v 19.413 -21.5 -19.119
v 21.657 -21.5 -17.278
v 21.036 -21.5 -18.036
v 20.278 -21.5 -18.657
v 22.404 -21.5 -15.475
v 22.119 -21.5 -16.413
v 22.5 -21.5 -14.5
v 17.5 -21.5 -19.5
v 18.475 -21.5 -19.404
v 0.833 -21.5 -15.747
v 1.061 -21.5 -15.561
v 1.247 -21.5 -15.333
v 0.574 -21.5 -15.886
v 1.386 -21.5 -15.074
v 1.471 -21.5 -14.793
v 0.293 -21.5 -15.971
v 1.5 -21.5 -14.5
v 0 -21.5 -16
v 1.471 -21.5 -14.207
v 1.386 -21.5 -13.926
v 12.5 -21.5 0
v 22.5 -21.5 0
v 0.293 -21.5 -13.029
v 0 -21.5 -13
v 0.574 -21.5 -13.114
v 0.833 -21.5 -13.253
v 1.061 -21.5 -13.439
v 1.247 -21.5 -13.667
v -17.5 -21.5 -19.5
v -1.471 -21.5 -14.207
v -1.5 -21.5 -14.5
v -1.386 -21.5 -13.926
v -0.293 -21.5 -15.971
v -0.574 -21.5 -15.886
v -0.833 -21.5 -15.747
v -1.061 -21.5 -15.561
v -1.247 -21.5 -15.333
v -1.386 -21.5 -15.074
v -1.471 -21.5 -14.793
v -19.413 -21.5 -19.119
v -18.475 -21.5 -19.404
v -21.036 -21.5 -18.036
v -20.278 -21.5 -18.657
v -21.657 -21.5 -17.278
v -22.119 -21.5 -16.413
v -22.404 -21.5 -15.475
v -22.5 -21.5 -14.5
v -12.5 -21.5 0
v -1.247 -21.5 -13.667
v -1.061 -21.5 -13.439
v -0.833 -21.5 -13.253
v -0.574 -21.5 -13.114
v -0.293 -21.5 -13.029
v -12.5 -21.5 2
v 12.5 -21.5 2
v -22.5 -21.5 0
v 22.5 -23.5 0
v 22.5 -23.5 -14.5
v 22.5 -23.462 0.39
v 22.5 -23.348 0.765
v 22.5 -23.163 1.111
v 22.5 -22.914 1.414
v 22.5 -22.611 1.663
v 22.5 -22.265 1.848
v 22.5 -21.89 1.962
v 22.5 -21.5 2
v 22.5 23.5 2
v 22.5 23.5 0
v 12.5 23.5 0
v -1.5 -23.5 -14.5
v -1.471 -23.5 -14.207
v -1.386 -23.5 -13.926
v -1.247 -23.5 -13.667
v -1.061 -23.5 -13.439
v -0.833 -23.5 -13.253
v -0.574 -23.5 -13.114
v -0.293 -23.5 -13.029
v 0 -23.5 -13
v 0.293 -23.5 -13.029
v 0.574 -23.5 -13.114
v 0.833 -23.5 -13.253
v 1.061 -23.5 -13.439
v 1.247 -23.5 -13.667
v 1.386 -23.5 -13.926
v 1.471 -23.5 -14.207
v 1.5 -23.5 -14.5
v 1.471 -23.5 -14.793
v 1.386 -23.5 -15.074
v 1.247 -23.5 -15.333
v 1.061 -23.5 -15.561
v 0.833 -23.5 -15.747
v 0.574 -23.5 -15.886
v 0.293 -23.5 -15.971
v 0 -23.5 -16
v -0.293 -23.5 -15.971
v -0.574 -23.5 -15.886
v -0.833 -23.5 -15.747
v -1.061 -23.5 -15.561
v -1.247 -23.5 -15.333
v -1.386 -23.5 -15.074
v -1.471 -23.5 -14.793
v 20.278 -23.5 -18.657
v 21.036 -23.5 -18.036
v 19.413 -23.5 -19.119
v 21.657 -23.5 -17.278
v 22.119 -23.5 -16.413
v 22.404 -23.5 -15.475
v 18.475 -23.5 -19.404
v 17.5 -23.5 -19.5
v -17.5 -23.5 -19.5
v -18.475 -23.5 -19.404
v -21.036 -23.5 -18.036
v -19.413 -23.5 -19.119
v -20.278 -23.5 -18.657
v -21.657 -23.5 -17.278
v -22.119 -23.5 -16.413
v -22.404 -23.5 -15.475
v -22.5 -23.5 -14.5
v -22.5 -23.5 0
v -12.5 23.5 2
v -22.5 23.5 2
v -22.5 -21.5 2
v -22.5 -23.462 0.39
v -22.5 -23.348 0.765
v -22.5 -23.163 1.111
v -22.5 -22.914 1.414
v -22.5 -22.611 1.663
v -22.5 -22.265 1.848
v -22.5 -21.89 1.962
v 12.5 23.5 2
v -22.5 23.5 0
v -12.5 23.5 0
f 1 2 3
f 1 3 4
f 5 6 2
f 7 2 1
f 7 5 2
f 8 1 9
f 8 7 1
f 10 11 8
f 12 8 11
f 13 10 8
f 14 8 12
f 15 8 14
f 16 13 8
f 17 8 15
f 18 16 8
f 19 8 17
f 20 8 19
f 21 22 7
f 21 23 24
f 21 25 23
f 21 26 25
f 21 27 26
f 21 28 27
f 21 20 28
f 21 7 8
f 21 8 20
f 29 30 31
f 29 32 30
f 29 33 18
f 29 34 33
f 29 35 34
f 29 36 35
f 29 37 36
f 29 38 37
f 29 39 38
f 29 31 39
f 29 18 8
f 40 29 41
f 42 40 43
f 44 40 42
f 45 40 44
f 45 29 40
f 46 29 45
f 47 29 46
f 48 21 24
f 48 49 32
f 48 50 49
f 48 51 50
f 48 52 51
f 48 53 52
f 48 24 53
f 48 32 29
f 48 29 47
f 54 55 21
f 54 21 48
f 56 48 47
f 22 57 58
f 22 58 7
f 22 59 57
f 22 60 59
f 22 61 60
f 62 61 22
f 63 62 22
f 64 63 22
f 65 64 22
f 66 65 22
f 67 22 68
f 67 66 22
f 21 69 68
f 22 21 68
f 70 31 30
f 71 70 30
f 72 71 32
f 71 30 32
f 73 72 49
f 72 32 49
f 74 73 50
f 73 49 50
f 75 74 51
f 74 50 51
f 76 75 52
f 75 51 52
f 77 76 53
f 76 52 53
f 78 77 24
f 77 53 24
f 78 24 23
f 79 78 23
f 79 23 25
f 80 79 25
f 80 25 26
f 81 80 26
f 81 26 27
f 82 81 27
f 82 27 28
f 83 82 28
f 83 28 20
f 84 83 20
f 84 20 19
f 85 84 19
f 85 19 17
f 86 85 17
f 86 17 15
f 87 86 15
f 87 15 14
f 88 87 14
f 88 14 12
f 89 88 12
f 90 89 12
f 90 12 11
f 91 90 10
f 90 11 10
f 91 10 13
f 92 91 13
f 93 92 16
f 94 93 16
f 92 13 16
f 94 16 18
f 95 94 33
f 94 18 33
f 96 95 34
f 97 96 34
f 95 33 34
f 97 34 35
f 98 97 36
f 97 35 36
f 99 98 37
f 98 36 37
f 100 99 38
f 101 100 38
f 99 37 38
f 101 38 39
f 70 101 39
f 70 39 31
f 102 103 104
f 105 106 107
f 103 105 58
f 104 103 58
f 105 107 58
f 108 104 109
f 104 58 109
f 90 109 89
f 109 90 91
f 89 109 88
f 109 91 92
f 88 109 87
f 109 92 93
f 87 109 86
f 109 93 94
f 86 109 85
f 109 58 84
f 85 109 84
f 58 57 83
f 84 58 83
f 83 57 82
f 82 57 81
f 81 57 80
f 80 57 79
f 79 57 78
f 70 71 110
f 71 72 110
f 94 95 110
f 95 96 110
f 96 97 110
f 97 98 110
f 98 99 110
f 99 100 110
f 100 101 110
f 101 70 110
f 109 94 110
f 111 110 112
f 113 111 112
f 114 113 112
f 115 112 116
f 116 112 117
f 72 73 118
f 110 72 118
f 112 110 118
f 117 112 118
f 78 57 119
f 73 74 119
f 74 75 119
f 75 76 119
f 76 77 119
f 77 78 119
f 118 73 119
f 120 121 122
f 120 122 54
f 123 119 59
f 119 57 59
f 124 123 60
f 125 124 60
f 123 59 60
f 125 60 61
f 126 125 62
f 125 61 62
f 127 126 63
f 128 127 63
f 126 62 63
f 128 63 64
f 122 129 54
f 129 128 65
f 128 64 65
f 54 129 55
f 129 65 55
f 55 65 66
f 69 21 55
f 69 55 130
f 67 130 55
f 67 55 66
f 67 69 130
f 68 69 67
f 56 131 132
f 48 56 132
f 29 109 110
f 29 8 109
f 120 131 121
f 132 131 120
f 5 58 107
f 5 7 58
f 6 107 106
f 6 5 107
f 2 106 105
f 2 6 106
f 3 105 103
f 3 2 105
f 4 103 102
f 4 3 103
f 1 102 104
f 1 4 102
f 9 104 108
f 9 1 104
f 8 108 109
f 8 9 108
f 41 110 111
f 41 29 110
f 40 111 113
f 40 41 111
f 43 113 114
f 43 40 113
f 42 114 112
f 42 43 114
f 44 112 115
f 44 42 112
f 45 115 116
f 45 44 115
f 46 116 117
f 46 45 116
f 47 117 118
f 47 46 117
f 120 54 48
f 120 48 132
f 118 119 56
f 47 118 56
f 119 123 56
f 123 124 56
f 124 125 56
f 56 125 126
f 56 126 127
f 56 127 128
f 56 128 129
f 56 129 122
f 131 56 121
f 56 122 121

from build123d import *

# Parameters (mm, degrees)
SKETCH1_W           = 45
SKETCH1_H           = 47
BOSS_EXTRUDE1_DEPTH = 2
SKETCH2_W           = 45
SKETCH2_H           = 2
BOSS_EXTRUDE2_DEPTH = 19.5
FILLET1_R           = 2
FILLET2_R           = 5
SKETCH3_W           = 25
SKETCH3_H           = 22.5
CUT_EXTRUDE1_DEPTH  = 39.99679474
SKETCH4_R           = 1.5
CUT_EXTRUDE2_DEPTH  = 54.958317246
SKETCH5_W           = 25
SKETCH5_H           = 22.5
CUT_EXTRUDE3_DEPTH  = 10


with BuildPart() as part:
    # Sketch1 → Boss-Extrude1 (new body)
    with BuildSketch(Plane.XY):
        Rectangle(SKETCH1_W, SKETCH1_H)
    extrude(amount=BOSS_EXTRUDE1_DEPTH)

    # Sketch2 → Boss-Extrude2 (add)
    with BuildSketch(Plane(origin=(0, 0, 0), x_dir=(-1, 0, 0), z_dir=(0, 0, -1))):
        with Locations((0, -22.5)):
            Rectangle(SKETCH2_W, SKETCH2_H)
    extrude(amount=BOSS_EXTRUDE2_DEPTH)

    # Fillet1
    fillet1_edges = [part.edges().sort_by_distance(p)[0] for p in [
        (0, -23.5, 2),
    ]]
    fillet(fillet1_edges, radius=FILLET1_R)

    # Fillet2
    fillet2_edges = [part.edges().sort_by_distance(p)[0] for p in [
        (22.5, -22.5, -19.5),
        (-22.5, -22.5, -19.5),
    ]]
    fillet(fillet2_edges, radius=FILLET2_R)

    # Sketch3 → Cut-Extrude1 (cut, through all)
    with BuildSketch(Plane.XY.offset(2)):
        with Locations((0, 12.25)):
            Rectangle(SKETCH3_W, SKETCH3_H)
    extrude(amount=-CUT_EXTRUDE1_DEPTH, mode=Mode.SUBTRACT)

    # Sketch4 → Cut-Extrude2 (cut, through all)
    with BuildSketch(Plane(origin=(0, -21.5, 0), x_dir=(1, 0, 0), z_dir=(0, 1, 0))):
        with Locations(Location((0, 14.5, 0), (0, 0, 180))):
            Circle(SKETCH4_R)
    extrude(amount=-CUT_EXTRUDE2_DEPTH, mode=Mode.SUBTRACT)

    # Sketch5 → Cut-Extrude3 (cut)
    with BuildSketch(Plane(origin=(0, 0, 0), x_dir=(-1, 0, 0), z_dir=(0, 0, -1))):
        with Locations((0, -10.25)):
            Rectangle(SKETCH5_W, SKETCH5_H)
    extrude(amount=-CUT_EXTRUDE3_DEPTH, mode=Mode.SUBTRACT)


solid = part.part
